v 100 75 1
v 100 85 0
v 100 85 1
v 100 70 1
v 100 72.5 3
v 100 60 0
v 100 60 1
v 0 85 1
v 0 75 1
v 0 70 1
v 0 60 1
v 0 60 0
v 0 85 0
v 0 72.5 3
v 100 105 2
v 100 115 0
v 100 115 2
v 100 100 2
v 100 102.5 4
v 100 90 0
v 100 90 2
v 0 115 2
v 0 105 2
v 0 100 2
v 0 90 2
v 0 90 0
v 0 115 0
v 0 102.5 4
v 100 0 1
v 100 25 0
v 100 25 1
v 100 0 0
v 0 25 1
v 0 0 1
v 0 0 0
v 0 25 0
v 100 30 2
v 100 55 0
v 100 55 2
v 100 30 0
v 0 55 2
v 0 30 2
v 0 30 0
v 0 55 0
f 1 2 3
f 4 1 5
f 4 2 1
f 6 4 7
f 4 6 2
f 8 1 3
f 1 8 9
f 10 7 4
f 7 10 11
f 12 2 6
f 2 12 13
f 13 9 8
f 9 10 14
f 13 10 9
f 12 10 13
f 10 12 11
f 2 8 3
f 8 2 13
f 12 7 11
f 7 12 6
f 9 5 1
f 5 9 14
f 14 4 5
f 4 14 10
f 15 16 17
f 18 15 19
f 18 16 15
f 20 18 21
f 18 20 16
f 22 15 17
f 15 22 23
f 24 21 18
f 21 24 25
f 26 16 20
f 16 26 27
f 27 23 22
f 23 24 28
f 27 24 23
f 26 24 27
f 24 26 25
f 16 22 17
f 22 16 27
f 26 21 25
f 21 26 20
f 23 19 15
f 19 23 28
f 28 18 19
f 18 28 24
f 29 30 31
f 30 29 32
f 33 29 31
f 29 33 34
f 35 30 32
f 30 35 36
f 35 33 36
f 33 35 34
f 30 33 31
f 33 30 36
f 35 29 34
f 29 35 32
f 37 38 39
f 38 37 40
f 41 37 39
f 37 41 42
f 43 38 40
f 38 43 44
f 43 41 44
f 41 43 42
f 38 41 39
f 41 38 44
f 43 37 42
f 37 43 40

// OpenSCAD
length = 100;
width = 25;
distance = 30;
spike_length = 5;
spike_height = 2;
spike_intersect = 0.5;

module spike() {
    x = spike_intersect * width / 2 / spike_height;
    echo(x);
    translate([0, width/2, 0])
    rotate([90, 0, 90])
    linear_extrude(height=length)
    polygon([
        [-x, -spike_intersect],
        [x, -spike_intersect],
    
//        [-spike_length / 2, 0],
  //      [spike_length / 2, 0],

        [0, spike_height]]);
}

cube([length, width, 1]);

translate([0, distance, 0])
cube([length, width, 2]);

translate([0, 2*distance, 0]) {
    union() {
        cube([length, width, 1]);
        translate([0, 0, 1]) spike();
    }
}

translate([0, 3*distance, 0]) {
    union() {
        cube([length, width, 2]);
        translate([0, 0, 2]) spike();
    }
}
